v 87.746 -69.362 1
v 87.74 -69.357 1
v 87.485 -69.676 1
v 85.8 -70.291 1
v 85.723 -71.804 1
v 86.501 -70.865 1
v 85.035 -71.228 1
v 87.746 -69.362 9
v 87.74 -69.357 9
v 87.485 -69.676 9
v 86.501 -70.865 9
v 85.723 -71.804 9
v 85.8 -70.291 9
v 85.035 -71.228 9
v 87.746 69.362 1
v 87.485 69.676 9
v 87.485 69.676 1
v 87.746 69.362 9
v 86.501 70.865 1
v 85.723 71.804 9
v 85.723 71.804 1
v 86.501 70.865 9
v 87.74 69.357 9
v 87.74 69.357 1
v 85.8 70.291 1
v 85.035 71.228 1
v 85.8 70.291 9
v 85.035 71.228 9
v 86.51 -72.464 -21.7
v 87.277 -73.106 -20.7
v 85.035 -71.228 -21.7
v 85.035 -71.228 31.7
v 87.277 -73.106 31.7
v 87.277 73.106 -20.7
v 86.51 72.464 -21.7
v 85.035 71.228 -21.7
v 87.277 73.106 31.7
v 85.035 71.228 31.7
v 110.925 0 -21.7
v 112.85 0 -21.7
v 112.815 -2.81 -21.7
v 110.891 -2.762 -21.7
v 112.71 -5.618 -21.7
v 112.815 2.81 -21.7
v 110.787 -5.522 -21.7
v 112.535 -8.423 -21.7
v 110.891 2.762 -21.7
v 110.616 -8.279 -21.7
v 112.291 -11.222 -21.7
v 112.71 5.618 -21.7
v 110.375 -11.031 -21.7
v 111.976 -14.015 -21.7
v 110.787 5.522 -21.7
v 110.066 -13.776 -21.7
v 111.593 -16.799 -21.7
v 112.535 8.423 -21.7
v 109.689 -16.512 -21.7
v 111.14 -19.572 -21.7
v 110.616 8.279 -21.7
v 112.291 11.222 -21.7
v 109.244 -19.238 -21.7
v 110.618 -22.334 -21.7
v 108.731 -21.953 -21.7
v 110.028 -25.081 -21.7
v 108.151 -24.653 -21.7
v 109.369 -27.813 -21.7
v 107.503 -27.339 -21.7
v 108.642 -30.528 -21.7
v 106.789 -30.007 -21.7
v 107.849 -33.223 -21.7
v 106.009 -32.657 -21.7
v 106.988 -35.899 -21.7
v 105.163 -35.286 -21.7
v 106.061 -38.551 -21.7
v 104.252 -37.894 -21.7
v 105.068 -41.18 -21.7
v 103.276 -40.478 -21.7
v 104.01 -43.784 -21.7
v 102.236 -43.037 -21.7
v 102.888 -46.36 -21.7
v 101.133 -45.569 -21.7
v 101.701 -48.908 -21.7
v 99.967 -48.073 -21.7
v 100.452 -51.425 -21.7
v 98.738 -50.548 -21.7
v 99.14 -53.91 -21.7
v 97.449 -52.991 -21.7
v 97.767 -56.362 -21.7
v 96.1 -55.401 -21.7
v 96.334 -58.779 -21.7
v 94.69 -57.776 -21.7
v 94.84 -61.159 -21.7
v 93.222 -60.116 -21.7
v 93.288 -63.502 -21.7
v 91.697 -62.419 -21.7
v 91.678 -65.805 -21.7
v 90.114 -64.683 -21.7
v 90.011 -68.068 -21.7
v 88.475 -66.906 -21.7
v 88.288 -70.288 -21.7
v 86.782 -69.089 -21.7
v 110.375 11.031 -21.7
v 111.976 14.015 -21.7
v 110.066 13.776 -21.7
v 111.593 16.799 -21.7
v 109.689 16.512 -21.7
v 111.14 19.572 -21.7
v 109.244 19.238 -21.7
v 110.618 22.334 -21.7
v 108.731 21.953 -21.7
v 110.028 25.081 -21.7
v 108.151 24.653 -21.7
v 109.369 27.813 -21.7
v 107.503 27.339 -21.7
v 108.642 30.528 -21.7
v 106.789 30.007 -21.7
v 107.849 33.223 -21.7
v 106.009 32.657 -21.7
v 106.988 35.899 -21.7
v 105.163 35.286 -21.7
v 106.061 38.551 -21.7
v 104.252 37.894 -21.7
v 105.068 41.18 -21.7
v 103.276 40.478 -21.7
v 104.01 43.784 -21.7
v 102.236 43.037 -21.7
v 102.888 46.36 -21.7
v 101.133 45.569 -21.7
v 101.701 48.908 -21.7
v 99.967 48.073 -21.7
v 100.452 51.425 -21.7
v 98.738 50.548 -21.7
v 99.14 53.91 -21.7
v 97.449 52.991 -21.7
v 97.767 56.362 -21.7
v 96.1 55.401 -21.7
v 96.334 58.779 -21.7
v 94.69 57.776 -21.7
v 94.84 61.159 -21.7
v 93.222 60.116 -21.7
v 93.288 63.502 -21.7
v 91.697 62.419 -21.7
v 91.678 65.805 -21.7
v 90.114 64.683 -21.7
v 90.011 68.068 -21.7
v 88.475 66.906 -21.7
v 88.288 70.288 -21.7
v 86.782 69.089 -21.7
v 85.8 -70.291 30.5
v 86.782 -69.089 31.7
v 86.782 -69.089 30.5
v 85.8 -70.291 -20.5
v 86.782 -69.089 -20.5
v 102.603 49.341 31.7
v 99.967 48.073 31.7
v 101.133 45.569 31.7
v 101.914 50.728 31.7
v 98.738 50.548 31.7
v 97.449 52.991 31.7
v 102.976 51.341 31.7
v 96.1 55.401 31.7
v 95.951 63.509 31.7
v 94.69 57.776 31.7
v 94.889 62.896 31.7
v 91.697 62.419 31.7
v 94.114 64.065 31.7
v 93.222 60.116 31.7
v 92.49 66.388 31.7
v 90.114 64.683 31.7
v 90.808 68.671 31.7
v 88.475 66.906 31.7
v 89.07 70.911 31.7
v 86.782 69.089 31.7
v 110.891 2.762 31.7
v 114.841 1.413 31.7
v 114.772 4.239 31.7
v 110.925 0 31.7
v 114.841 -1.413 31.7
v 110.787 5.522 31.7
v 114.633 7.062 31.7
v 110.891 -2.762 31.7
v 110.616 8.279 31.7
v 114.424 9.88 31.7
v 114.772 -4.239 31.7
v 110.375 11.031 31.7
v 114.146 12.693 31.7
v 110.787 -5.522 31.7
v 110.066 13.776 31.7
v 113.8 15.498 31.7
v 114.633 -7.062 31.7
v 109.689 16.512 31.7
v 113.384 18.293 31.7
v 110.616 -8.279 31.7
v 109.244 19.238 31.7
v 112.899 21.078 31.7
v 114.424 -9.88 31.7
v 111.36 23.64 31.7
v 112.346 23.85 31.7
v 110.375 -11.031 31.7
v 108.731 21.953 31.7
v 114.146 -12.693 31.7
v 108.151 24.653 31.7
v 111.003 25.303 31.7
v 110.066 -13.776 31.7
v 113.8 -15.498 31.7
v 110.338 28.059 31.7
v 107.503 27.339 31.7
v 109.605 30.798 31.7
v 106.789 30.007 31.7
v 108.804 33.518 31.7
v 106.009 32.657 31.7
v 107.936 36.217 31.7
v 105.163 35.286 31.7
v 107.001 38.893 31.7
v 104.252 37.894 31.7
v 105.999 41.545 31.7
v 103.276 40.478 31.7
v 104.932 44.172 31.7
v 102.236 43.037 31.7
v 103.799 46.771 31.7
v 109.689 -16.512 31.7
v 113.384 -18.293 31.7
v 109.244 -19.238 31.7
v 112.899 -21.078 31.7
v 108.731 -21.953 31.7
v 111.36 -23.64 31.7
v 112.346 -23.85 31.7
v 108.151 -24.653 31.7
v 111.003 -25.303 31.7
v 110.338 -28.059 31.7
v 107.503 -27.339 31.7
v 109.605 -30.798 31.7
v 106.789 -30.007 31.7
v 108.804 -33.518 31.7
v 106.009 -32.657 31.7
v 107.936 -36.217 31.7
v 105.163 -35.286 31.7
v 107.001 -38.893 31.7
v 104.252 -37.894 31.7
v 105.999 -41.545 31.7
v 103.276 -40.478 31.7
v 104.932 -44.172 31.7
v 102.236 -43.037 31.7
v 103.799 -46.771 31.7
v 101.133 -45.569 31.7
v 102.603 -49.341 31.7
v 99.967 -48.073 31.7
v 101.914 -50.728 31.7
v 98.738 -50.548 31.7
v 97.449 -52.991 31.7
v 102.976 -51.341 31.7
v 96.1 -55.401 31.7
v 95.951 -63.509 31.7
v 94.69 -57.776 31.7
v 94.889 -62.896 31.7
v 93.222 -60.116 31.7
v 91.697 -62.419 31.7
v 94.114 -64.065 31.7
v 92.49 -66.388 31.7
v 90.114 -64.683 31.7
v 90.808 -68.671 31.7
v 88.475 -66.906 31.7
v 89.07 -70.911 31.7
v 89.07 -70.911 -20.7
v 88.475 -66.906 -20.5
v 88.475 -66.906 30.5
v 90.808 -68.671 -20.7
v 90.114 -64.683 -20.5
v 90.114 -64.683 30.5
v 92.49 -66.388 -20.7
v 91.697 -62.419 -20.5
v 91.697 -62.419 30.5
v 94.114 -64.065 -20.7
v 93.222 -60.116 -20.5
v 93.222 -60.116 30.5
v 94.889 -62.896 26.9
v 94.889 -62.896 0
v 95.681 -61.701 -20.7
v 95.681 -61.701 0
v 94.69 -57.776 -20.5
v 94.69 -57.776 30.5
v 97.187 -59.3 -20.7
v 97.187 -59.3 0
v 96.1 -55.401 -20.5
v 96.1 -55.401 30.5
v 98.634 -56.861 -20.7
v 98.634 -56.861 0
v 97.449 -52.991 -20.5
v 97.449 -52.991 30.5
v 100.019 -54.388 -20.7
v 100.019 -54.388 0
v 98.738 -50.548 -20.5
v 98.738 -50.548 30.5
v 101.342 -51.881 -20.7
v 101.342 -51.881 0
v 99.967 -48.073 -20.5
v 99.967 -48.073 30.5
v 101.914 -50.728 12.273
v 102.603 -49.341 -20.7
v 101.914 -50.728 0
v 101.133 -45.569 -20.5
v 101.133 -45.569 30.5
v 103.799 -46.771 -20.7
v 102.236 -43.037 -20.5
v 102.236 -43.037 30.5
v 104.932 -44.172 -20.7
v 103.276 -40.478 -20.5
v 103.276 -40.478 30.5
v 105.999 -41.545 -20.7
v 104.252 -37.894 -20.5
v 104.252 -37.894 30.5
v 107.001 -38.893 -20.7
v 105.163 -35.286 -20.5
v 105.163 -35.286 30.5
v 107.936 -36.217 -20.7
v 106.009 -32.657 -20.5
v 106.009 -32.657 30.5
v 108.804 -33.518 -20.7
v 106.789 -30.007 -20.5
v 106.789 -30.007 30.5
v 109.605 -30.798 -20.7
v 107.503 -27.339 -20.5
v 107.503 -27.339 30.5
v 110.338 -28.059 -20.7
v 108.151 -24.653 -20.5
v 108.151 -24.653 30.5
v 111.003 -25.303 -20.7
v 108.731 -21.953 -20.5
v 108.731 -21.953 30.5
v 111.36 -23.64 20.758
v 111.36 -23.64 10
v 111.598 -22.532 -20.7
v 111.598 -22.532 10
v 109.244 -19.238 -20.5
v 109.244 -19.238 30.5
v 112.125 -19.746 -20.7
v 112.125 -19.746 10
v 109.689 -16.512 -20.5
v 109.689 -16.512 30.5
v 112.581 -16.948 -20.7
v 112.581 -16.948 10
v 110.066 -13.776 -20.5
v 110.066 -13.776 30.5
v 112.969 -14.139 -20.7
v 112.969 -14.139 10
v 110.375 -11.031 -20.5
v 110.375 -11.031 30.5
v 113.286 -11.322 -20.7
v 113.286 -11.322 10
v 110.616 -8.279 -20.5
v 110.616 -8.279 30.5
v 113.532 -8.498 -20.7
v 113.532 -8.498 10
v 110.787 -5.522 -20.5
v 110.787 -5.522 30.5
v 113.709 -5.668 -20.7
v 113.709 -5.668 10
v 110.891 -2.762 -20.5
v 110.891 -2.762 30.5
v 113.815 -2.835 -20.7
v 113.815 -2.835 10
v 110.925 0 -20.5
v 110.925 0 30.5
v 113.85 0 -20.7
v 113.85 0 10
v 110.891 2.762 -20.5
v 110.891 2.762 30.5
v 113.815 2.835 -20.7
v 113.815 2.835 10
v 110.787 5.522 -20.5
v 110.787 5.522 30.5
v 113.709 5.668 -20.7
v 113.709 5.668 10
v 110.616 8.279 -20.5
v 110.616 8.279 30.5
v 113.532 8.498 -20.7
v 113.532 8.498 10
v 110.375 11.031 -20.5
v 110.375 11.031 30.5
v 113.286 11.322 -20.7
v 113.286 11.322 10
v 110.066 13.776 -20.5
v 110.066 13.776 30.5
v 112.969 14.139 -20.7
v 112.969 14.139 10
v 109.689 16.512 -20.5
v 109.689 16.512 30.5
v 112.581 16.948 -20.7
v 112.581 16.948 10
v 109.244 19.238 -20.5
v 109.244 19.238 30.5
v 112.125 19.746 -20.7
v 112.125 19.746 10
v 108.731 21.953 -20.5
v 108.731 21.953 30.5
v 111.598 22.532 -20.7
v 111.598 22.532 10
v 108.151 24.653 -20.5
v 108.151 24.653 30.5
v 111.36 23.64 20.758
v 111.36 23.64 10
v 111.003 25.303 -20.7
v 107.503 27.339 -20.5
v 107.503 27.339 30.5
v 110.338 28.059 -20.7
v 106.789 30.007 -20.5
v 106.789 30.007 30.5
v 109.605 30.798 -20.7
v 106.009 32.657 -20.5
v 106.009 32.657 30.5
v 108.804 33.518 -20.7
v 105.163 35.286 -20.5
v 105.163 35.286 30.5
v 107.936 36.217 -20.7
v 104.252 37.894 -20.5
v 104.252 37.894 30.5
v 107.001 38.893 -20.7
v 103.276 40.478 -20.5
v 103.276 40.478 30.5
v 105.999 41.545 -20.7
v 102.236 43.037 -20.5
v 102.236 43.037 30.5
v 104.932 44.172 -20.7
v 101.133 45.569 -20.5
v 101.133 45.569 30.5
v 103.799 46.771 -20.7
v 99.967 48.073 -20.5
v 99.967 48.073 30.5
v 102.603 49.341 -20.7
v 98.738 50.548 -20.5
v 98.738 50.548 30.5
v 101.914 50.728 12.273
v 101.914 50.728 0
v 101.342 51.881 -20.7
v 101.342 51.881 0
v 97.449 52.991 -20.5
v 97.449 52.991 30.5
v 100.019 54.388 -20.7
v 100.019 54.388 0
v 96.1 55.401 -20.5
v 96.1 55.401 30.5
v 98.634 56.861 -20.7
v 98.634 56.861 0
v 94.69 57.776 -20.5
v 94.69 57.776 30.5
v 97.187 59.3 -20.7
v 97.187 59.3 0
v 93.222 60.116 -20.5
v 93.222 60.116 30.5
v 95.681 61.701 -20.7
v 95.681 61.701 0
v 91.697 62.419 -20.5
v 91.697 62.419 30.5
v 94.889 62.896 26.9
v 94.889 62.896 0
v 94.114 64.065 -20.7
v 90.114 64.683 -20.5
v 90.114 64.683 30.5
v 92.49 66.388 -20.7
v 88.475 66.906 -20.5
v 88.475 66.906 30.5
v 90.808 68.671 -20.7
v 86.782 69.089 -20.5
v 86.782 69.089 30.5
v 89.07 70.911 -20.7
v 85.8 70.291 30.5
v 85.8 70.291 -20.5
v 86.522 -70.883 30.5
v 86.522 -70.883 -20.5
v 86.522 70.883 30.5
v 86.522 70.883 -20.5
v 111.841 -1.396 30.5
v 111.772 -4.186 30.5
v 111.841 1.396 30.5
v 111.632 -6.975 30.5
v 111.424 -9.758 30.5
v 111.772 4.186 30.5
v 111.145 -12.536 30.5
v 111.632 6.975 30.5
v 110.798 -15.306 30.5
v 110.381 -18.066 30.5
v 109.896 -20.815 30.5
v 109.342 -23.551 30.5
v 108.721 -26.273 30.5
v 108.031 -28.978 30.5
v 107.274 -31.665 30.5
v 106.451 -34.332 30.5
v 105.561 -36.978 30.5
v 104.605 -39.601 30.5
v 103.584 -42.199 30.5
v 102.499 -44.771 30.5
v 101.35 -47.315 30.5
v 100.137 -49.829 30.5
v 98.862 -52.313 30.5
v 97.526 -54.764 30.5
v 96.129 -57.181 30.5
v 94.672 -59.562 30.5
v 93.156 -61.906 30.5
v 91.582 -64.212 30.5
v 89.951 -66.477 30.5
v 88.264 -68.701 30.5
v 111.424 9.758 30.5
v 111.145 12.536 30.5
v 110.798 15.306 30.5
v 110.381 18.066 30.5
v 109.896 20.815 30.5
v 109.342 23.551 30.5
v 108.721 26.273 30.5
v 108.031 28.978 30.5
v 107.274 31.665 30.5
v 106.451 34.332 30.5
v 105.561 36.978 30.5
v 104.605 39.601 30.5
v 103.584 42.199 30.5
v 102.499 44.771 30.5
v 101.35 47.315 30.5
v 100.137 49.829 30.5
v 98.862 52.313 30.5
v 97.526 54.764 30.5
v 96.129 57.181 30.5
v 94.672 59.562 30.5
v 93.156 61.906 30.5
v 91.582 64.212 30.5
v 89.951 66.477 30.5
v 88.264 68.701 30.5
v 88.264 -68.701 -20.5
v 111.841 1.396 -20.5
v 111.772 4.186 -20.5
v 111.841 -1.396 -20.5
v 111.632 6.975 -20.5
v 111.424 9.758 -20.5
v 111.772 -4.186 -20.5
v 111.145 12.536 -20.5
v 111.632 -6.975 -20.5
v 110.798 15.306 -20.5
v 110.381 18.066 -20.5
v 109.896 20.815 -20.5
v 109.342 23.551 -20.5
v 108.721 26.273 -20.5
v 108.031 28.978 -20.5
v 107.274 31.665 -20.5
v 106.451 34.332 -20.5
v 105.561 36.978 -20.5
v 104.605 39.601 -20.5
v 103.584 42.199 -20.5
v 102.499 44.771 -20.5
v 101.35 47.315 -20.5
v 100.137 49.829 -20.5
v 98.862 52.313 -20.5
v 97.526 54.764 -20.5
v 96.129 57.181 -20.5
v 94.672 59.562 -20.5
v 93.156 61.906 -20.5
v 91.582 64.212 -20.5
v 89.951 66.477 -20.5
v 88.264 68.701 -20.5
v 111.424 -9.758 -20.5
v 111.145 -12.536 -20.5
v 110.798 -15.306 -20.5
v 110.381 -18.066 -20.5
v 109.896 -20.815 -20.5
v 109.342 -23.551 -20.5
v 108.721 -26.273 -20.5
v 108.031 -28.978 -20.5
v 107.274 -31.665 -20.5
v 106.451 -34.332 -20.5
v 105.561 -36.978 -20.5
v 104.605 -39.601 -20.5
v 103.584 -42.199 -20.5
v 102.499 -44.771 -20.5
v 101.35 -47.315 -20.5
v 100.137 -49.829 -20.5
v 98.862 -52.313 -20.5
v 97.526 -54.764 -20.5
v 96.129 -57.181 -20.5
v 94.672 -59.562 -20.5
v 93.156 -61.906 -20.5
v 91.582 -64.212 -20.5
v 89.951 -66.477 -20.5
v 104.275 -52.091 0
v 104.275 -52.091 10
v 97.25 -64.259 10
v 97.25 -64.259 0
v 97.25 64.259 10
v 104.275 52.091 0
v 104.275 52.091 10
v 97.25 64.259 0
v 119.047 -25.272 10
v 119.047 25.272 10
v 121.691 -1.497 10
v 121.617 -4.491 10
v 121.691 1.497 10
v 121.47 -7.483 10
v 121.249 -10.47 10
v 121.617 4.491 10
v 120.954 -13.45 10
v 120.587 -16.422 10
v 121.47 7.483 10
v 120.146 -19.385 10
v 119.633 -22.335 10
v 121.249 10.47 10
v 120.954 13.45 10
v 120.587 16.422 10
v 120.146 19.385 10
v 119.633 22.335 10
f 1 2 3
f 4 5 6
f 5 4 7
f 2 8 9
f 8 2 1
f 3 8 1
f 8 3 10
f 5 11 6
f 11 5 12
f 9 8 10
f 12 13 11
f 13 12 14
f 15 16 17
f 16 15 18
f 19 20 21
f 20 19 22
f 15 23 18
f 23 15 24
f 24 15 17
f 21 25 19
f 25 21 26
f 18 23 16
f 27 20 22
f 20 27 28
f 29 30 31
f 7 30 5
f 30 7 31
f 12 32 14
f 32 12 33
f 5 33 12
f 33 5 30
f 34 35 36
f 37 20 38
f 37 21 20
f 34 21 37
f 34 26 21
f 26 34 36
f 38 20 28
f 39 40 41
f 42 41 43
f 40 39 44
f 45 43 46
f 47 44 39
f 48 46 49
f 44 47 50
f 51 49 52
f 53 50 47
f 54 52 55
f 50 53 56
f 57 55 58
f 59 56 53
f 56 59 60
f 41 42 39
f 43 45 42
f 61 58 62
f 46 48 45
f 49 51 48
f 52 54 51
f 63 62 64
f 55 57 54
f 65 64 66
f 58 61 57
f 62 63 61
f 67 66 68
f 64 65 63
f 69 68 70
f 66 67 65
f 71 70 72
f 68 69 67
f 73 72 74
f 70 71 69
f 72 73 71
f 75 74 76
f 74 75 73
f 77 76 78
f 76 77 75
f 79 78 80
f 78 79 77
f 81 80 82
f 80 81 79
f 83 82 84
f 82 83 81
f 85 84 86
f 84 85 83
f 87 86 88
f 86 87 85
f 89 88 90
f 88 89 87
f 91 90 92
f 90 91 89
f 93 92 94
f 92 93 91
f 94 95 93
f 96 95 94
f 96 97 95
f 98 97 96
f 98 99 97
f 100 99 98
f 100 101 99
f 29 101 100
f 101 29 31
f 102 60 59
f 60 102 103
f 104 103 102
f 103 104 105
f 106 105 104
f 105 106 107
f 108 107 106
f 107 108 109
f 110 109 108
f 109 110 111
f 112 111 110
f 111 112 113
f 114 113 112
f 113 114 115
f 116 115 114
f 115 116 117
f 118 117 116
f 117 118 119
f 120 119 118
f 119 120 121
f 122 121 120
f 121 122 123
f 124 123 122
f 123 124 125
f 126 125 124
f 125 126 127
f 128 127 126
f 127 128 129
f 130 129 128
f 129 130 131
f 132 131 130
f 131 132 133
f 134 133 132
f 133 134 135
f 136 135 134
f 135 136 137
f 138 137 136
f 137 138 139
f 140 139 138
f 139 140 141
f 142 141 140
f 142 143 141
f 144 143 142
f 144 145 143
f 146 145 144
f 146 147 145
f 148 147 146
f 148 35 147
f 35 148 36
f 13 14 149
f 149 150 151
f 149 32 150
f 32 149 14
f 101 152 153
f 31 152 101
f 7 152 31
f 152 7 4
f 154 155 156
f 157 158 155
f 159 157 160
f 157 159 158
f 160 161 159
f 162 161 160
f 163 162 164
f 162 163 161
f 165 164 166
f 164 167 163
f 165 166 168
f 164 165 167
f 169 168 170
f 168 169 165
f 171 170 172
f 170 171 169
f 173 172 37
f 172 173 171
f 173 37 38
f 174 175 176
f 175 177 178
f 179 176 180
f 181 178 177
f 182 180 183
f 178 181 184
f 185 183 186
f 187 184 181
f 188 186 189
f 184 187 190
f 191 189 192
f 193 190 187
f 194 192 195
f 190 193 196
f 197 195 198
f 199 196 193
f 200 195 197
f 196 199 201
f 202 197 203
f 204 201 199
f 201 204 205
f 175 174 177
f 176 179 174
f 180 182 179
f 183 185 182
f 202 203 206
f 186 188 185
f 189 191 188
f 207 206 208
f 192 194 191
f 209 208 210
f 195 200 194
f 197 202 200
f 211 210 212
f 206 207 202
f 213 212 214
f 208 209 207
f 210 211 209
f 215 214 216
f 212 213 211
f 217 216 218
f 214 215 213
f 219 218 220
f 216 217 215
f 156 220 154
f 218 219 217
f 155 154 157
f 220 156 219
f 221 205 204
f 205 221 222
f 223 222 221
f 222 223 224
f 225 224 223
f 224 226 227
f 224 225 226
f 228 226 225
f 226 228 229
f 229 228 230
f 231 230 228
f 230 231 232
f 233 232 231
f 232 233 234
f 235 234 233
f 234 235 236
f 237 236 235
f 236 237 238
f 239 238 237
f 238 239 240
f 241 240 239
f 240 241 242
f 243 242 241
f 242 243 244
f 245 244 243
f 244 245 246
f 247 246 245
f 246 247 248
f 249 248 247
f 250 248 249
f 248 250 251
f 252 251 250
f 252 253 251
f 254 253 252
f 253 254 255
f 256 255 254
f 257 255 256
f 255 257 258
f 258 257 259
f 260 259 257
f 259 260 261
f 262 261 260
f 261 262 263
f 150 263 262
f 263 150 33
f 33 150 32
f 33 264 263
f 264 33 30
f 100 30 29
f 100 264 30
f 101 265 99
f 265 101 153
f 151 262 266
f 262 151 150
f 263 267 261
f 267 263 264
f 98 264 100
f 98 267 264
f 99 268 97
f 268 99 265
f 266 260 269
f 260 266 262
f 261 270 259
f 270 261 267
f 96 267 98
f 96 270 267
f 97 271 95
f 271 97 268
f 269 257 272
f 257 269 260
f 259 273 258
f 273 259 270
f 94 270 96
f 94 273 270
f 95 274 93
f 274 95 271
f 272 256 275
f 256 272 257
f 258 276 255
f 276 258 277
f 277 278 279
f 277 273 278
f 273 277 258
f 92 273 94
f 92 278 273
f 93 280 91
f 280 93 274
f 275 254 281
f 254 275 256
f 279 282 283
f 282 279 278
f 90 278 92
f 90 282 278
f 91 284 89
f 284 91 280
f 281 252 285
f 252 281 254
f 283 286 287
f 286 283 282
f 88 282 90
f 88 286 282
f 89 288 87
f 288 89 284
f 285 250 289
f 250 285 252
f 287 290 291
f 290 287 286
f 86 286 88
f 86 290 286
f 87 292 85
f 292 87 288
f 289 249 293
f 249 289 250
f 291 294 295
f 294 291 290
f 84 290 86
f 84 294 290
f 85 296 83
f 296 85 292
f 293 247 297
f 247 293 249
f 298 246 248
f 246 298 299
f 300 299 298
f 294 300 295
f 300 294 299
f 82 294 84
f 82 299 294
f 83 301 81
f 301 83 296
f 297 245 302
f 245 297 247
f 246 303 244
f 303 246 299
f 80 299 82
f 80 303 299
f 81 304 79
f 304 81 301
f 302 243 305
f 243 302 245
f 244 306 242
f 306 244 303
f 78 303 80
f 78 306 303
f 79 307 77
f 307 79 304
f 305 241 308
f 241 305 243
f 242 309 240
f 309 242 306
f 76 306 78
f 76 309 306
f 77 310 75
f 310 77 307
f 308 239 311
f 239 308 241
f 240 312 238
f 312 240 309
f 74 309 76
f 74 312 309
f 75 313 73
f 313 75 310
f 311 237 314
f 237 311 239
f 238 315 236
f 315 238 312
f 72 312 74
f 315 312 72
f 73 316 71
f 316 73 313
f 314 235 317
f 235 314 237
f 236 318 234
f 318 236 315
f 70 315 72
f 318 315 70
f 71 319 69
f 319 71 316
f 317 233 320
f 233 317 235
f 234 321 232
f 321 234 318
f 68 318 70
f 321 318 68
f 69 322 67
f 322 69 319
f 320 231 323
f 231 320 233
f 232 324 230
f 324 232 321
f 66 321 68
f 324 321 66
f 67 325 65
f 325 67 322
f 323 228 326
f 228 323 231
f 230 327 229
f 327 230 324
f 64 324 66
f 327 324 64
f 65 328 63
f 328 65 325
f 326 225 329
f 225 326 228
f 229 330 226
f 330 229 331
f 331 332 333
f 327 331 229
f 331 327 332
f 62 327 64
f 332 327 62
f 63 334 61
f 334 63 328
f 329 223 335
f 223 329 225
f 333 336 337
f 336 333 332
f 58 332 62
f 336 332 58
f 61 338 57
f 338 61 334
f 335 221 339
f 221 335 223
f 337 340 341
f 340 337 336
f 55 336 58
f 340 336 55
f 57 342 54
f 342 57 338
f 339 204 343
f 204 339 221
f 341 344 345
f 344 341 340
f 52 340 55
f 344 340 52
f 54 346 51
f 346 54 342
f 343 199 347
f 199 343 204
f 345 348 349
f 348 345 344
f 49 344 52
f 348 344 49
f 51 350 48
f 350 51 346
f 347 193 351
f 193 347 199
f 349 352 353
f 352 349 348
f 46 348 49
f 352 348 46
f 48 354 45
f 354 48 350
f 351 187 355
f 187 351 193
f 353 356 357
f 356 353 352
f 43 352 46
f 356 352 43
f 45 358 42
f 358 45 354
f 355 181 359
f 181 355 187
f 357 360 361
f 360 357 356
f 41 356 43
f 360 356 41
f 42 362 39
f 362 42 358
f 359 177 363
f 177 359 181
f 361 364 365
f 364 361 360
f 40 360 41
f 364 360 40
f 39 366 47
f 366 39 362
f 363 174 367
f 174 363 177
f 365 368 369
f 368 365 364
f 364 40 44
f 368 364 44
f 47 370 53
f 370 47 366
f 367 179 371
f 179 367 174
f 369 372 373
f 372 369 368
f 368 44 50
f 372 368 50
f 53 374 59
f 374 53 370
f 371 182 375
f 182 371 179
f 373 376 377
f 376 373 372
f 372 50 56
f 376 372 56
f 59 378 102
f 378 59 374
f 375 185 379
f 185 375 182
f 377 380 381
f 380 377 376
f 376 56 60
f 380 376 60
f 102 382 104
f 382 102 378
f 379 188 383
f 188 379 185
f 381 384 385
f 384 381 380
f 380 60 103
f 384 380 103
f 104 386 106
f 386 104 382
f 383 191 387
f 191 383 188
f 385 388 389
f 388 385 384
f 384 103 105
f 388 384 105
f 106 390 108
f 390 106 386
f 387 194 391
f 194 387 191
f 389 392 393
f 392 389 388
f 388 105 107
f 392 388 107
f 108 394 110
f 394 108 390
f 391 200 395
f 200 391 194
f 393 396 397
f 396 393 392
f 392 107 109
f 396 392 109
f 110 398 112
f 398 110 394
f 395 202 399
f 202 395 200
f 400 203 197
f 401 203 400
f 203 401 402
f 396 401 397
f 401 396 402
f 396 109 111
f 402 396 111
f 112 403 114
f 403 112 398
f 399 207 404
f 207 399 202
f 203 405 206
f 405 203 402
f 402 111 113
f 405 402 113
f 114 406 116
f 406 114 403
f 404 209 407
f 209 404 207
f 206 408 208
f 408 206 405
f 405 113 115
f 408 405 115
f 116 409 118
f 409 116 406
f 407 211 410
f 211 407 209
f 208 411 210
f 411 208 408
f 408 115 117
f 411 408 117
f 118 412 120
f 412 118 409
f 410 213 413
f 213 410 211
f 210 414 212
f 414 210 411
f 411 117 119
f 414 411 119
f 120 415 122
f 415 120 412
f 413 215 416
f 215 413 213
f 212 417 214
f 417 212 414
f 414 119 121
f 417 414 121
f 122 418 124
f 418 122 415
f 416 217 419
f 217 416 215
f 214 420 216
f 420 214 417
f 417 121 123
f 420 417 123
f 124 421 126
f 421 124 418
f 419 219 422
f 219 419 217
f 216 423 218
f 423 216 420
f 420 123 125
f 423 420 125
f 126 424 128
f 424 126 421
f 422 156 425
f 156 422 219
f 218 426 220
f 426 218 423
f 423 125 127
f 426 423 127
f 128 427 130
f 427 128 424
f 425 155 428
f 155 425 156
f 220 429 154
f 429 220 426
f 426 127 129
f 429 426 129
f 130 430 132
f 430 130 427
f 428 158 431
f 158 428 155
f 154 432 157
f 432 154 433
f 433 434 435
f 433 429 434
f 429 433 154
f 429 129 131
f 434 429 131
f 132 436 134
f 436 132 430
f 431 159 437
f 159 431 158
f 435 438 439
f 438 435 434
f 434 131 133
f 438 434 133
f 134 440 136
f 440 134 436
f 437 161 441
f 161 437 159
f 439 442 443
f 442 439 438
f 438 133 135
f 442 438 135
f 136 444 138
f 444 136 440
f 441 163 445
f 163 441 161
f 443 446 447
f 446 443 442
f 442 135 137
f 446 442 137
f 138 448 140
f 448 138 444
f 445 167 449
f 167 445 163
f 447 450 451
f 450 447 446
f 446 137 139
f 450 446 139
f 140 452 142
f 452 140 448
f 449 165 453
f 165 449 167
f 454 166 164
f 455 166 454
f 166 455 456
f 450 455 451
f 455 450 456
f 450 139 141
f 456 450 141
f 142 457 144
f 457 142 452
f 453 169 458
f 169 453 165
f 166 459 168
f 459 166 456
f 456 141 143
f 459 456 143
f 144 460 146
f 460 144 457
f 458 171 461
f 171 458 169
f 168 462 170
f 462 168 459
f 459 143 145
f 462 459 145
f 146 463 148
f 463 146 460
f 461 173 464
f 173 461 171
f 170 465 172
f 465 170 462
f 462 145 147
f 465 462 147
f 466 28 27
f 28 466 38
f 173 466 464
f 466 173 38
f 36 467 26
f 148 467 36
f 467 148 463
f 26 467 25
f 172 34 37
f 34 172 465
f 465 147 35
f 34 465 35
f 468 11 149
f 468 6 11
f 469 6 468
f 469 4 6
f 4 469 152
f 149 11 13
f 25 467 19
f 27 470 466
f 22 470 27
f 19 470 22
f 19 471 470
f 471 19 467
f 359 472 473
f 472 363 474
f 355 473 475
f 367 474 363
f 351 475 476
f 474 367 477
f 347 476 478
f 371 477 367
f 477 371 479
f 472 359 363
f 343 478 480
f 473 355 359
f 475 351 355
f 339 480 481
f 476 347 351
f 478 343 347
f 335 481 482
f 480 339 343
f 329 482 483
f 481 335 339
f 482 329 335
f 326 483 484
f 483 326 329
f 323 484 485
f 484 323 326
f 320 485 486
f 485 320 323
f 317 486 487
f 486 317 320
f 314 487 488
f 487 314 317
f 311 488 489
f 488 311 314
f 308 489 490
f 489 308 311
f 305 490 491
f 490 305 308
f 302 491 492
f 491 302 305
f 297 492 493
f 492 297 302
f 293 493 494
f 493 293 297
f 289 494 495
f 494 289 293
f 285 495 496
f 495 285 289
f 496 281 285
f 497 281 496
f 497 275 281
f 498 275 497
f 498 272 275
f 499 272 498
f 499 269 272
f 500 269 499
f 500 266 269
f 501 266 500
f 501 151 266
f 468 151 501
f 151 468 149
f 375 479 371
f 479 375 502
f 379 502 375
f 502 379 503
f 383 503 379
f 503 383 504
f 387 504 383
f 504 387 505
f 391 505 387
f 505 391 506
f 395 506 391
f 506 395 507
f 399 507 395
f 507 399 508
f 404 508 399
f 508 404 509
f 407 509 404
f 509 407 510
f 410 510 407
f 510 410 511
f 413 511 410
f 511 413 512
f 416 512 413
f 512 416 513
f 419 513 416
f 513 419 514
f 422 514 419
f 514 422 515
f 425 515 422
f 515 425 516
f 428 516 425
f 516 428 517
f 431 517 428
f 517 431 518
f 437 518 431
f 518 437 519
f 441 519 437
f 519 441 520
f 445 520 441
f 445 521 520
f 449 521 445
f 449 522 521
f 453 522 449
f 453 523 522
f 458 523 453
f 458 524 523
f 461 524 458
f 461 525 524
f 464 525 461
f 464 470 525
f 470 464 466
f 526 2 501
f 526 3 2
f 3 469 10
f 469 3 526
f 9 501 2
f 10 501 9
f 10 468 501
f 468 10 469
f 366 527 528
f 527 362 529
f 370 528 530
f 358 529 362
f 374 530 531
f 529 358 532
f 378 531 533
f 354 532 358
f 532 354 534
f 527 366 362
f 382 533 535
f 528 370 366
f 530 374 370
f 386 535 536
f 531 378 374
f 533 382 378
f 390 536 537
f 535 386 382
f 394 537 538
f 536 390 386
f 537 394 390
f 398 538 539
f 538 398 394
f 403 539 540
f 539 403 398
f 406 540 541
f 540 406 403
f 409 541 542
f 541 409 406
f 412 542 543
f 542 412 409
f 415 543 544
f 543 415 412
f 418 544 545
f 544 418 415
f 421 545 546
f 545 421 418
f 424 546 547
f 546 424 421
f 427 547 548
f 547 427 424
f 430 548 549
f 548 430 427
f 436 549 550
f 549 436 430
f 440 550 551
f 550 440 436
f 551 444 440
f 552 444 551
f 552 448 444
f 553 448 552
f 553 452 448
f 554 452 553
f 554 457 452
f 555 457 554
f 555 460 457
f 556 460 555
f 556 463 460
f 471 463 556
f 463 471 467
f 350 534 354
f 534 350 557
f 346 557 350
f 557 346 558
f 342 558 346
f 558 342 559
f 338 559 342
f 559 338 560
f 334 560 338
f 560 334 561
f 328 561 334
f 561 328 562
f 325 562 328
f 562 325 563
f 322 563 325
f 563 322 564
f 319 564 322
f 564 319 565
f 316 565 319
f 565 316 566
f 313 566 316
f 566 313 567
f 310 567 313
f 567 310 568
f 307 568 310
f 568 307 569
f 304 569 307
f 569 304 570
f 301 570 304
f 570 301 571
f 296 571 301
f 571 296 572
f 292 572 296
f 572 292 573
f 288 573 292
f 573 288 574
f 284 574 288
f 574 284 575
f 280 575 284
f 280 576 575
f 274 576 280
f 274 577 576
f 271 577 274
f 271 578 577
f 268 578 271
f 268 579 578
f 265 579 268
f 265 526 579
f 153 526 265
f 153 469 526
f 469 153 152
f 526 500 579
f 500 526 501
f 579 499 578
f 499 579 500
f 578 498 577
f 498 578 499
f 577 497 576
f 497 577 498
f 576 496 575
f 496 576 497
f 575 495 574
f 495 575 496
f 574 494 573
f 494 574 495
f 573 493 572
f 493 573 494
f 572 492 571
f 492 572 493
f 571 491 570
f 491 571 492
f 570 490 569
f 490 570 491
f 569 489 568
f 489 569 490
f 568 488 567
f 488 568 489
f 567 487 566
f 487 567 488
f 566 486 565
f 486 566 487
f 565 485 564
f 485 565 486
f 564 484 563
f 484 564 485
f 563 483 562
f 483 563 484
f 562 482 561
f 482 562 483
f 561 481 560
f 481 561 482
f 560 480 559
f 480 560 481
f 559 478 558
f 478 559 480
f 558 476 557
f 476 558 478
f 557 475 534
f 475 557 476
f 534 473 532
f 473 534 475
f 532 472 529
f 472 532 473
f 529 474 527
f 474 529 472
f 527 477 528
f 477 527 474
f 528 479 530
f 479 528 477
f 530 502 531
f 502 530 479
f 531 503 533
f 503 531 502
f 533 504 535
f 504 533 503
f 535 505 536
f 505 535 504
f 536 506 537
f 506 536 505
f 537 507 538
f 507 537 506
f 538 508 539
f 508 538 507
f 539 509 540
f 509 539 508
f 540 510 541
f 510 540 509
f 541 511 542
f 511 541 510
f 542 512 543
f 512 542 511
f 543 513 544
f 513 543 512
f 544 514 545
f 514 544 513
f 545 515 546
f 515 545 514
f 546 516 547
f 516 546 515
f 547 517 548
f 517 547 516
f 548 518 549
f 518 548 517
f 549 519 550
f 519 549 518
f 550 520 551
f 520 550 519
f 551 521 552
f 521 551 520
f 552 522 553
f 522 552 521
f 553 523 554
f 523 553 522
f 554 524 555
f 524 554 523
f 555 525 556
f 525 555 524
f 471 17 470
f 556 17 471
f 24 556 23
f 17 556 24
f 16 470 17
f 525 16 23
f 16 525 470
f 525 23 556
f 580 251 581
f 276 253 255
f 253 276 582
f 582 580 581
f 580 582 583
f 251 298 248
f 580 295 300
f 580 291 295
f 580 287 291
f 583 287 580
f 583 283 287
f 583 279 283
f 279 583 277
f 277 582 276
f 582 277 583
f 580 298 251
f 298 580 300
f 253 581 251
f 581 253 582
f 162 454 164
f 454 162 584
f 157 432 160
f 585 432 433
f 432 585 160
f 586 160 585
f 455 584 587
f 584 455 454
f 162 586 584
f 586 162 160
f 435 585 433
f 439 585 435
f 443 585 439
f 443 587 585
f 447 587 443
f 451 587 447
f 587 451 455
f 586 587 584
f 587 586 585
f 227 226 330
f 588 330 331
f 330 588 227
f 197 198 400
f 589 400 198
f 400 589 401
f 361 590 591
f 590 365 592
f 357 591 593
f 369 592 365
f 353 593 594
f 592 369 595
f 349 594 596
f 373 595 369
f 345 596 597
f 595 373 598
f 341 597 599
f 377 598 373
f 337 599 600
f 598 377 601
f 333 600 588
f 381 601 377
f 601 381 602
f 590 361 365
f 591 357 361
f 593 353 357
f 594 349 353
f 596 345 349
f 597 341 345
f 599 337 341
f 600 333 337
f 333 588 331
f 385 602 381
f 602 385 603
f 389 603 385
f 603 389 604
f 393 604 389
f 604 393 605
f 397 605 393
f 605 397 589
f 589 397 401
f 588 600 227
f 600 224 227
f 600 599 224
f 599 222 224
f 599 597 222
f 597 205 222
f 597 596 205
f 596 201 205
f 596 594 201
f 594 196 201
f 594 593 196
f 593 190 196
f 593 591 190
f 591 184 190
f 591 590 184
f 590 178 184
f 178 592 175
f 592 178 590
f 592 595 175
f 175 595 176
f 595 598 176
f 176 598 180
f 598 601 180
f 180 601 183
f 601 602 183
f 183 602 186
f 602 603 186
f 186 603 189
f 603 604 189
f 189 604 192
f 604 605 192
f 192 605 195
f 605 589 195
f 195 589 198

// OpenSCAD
// file: ../purchased/heat_pad.scad
/**
 * @file heat_pad.scad
 * @brief A silicone heating pad, drawn flat: length along x and height along z, centred on both,
 * with the glass-side face on y = 0 and the thickness toward +y
 * @author Cameron K. Brooks
 * @copyright 2026
 */

function heat_pad_name(type) = type[0];
function heat_pad_part_number(type) = type[1];
function heat_pad_length(type) = type[2][0];
function heat_pad_height(type) = type[2][1];
function heat_pad_thickness(type) = type[2][2];
function heat_pad_volts(type) = type[3][0];
function heat_pad_watts(type) = type[3][1];
function heat_pad_resistance(type) = type[4];
function heat_pad_lead_length(type) = type[5];
// the red-orange of the silicone
function heat_pad_color() = "#e2502a";

/**
 * @brief Draws a registered heating pad (see heat_pads.scad)
 * @param type Registered parameter set
 */
module heat_pad(type) {
  color(heat_pad_color())
    translate([-heat_pad_length(type) / 2, 0, -heat_pad_height(type) / 2])
      cube([heat_pad_length(type), heat_pad_thickness(type), heat_pad_height(type)]);
}
// file: ../utils/registries.scad
/**
 * @brief Look up a registered row by name.
 *
 * Build designations are passed as names, so every registry a build can designate wraps this
 * function below its list, where the list is in scope (a function resolves globals from its own
 * file):
 *
 *     use <../utils/registries.scad>;
 *     function shaft_by_name(name) = registry_by_name(shafts, name, "ssllsn");
 *
 * Rows are read by position, so `fields` describes the row layout. It is a signature with one
 * letter per field (s string, n number, l list, b bool; upper case if the field may also be
 * undef), or a list of signatures when a trailing field is optional. A plain number is also
 * accepted and checks only the length. Every row is checked on every lookup, not only the
 * requested one. A row with a missing or extra field, or a list where a number belongs, fails here
 * instead of returning the wrong value. Two swapped fields of the same type still pass; only named
 * fields would catch that.
 *
 * A missing name returns undef, and so does a duplicate name: two rows with the same name is a
 * defect, not a choice by list order. The caller must assert on the result, because only it can
 * name the registry searched. A failing assert exits 0, so the checks detect its ERROR line.
 */
function registry_by_name(rows, name, fields) =
  let (_checked = registry_checked(rows, fields))
  let (_m = [for (r = _checked) if (r[0] == name) r]) len(_m) == 1 ? _m[0] : undef;

// Returns the rows after checking that each fits one of the signatures. Also used directly for a
// registry whose rows have no name.
function registry_checked(rows, fields) =
  let (
    _n = is_list(fields) ? fields : [fields],
    _bad = [for (r = rows) if (len([for (f = _n) if (registry_row_fits(r, f)) f]) == 0) r[0]]
  )
  assert(len(_bad) == 0, str("registry rows ", _bad, " do not fit ", fields))
  rows;

function registry_row_fits(row, fields) =
  is_num(fields) ? len(row) == fields
  : len(row) == len(fields) && len([for (i = [0:len(fields) - 1]) if (!registry_field_fits(row[i], fields[i])) i]) == 0;

function registry_field_fits(v, t) =
  t == "s" ? is_string(v)
  : t == "n" ? is_num(v)
  : t == "l" ? is_list(v)
  : t == "b" ? is_bool(v)
  : t == "S" ? is_undef(v) || is_string(v)
  : t == "N" ? is_undef(v) || is_num(v)
  : t == "L" ? is_undef(v) || is_list(v)
  : t == "B" ? is_undef(v) || is_bool(v)
  : assert(false, str("registry signature letter \"", t, "\" is not one of s n l b S N L B"));
// file: ../purchased/heat_pads.scad
// parameters for physical realization of silicone heating pads
// DO NOT FORMAT THIS FILE, as it is manually spaced out for readability

// Silicone rubber over a nichrome element, powered from the reactor 12 V rail and held directly
// against the outside of the jar. No built-in thermostat: whatever switches the rail controls the
// pads. Size, thickness, cold resistance and lead length are measured on a delivered pad. Volts
// and watts are from the listing. At 12 V the measured resistance sets the power, not the watts
// column.

//                       ["name",       part_no,      [length, height, thickness], [volts, watts], ohms, lead]
// Generic 4-pack, 12 V 20 W, 150 x 50 mm - https://www.amazon.ca/dp/B0C4GX3F76
// Measured 2026-10-04: 7.6 ohm cold, so 18.9 W at 12 V; 320 mm leads.
heat_pad_20w_150x50 = ["20W 150x50", "B0C4GX3F76", [150,    50,     1.85     ], [12,    20   ], 7.6,  320 ];

// MECCANIXITY 2-pack, 12 V 30 W, 150 x 50 mm - https://www.amazon.ca/dp/B0GWNFH6LH
// Pending delivery; to be registered once measured. The listing gives only the 150 x 50 size.
// Cold resistance should be near 12^2 / 30 = 4.8 ohm.
// heat_pad_30w_150x50 = ["30W 150x50", "B0GWNFH6LH", [150,    50,     undef    ], [12,    30   ], undef, undef];

heat_pads = [heat_pad_20w_150x50];

use <../utils/registries.scad>;
function heat_pad_by_name(name) = registry_by_name(heat_pads, name, "ssllnn");

use <heat_pad.scad>

// example usage - keep commented, this file is include'd
// heat_pad(heat_pad_20w_150x50);
// main file
/**
 * @file heat_pad_mount.scad
 * @brief Holder for a silicone heating pad on the jar: a curved plate that holds the pad, hung
 * behind a rib arc
 * @author Cameron K. Brooks
 * @copyright 2026
 *
 * The pad sits directly on the glass, with the plate behind it. The inner face of the rib is
 * recessed to take the pad and plate with a small fit clearance. The rib arc between its rods acts
 * as the spring that holds the pad against the glass. Shim behind the plate until it is snug. The
 * plate drops in from the open band above the rib. Its hook rests on the top face of the rib, and
 * its two tabs slide down the empty light pockets of the rib, which locate it around the jar.
 *
 * All parts are placed about the jar axis: angle 0 is the centre of the plate, and z = 0 is the
 * bottom face of the rib arc it hangs behind. The render in this file is a preview.
 */

include <../purchased/heat_pads.scad>;

$fn = $preview ? 64 : 256;

/* [Preview] */

// Heating pad used in the preview
mount_pad_name = "20W 150x50"; // [20W 150x50]
// Outside radius of the jar, in mm
mount_glass_radius = 110;
// Height of the rib arc the plate hangs behind, in mm
mount_rib_height = 10;
// Radius of the back wall of the light pockets, in mm
mount_pocket_back = 118.7;
// Width of a light pocket, in mm
mount_pocket_width = 14.85;
// Angles of the pockets used by the tabs, either side of the plate centre, in degrees
mount_tab_angles = [-30, 30];
// Show the pad in place
mount_show_pad = true;

/* [Plate] */

// Thickness of the plate behind the pad, in mm
heat_pad_plate_thickness = 2;
// Radial clearance between the plate and the recess, taken up by shims, in mm
heat_pad_fit_clearance = 0.2;
// Chamfer on the lower back edge of the plate, to guide it into the recess, in mm
heat_pad_lead_in = 1;
// Width of the wall around the pad, in mm
heat_pad_wall_width = 1.2;
// Height of that wall toward the glass, as a fraction of the pad thickness
heat_pad_wall_fraction = 0.5;
// Gap between the pad edge and the wall, on each side, in mm
heat_pad_side_clearance = 0.5;
// Width of the lead notch through the end walls, in mm
heat_pad_lead_notch = 8;
// Distance the hook extends over the rib top face beyond the pocket back wall, in mm
heat_pad_hook_reach = 3;
// Remaining depth of the hook and tab stiffeners at the top edge of the plate, in mm
heat_pad_stiffener_top = 1;
// Angular width of the hook, as a fraction of the plate width
heat_pad_hook_fraction = 0.3;
// Distance a tab projects behind the plate, in mm
heat_pad_tab_depth = 2.5;
// Clearance on each side of a tab in its pocket, in mm
heat_pad_pocket_clearance = 0.4;
// Angular clearance at each end between the plate and the recess, in degrees
heat_pad_recess_end_clearance = 1;

module dummy() {
  // stop the customizer detection from here onwards
}

// ----- radii, from the glass out -----

function heat_pad_plate_inner_radius(pad, glass_r) = glass_r + heat_pad_thickness(pad);
function heat_pad_plate_outer_radius(pad, glass_r) = heat_pad_plate_inner_radius(pad, glass_r) + heat_pad_plate_thickness;
function heat_pad_recess_radius(pad, glass_r) = heat_pad_plate_outer_radius(pad, glass_r) + heat_pad_fit_clearance;

// ----- sizes -----

// The bay that holds the pad, then the plate around it.
function heat_pad_bay_length(pad) = heat_pad_length(pad) + 2 * heat_pad_side_clearance;
function heat_pad_bay_height(pad) = heat_pad_height(pad) + 2 * heat_pad_side_clearance;
function heat_pad_plate_length(pad) = heat_pad_bay_length(pad) + 2 * heat_pad_wall_width;
function heat_pad_plate_height(pad) = heat_pad_bay_height(pad) + 2 * heat_pad_wall_width;
// Arc lengths are measured at the pad radius, which is the glass radius.
function heat_pad_angle(len, glass_r) = len / glass_r * 180 / PI;
function heat_pad_plate_span(pad, glass_r) = heat_pad_angle(heat_pad_plate_length(pad), glass_r);
function heat_pad_recess_span(pad, glass_r) = heat_pad_plate_span(pad, glass_r) + 2 * heat_pad_recess_end_clearance;
// The plate is centred on the height of the rib arc.
function heat_pad_plate_bottom(pad, rib_h) = rib_h / 2 - heat_pad_plate_height(pad) / 2;

// A ring sector about z, centred on angle 0.
module heat_pad_sector(r0, r1, z0, z1, span) {
  rotate([0, 0, -span / 2])
    rotate_extrude(angle=span)
      translate([r0, z0]) square([r1 - r0, z1 - z0]);
}

/**
 * @brief The plate in its installed position, with the pad behind it. It prints top edge down.
 * The hook and the tabs each have a stiffener that runs up to that edge, so they print from the
 * bed without overhangs.
 */
module heat_pad_plate(pad, glass_r, rib_h, pocket_back, pocket_w, tab_angles) {
  _ri = heat_pad_plate_inner_radius(pad, glass_r);
  _ro = heat_pad_plate_outer_radius(pad, glass_r);
  _z0 = heat_pad_plate_bottom(pad, rib_h);
  _z1 = _z0 + heat_pad_plate_height(pad);
  _span = heat_pad_plate_span(pad, glass_r);
  _bay = heat_pad_angle(heat_pad_bay_length(pad), glass_r);
  _wall_r = _ri - heat_pad_wall_fraction * heat_pad_thickness(pad);
  _tab_w = pocket_w - 2 * heat_pad_pocket_clearance;
  _tab_r = _ro + heat_pad_tab_depth;
  _sink = heat_pad_plate_thickness / 2;

  union() {
    // The plate and the wall around the pad are one profile, from the wall face to the back of
    // the plate, with the lower back edge chamfered as a lead-in to the recess. The pad bay and
    // the lead exit through both end walls at mid-height are cut from it. It is one solid, so no
    // two parts share a surface. Each cut overshoots the wall face toward the glass, where nothing
    // is kept.
    difference() {
      rotate([0, 0, -_span / 2])
        rotate_extrude(angle=_span)
          polygon([[_wall_r, _z0], [_ro - heat_pad_lead_in, _z0], [_ro, _z0 + heat_pad_lead_in], [_ro, _z1], [_wall_r, _z1]]);
      heat_pad_sector(_wall_r - 1, _ri, _z0 + heat_pad_wall_width, _z1 - heat_pad_wall_width, _bay);
      for (s = [-1, 1])
        rotate([0, 0, s * (_span + _bay) / 4])
          heat_pad_sector(_wall_r - 1, _ri, (_z0 + _z1) / 2 - heat_pad_lead_notch / 2, (_z0 + _z1) / 2 + heat_pad_lead_notch / 2, (_span - _bay) / 2 + 2);
    }
    // the hook, over the top face of the rib, tapering up to the top edge
    rotate([0, 0, -_span * heat_pad_hook_fraction / 2])
      rotate_extrude(angle=_span * heat_pad_hook_fraction)
        polygon([
          [_ro - _sink, rib_h],
          [pocket_back + heat_pad_hook_reach, rib_h],
          [_ro + heat_pad_stiffener_top, _z1],
          [_ro - _sink, _z1],
        ]);
    // the tabs, the full rib height inside the pockets, tapering up to the top edge
    for (a = tab_angles)
      rotate([0, 0, a])
        rotate([90, 0, 0])
          linear_extrude(_tab_w, center=true)
            polygon([
              [_ro - _sink, 0],
              [_tab_r, 0],
              [_tab_r, rib_h],
              [_ro + heat_pad_stiffener_top, _z1],
              [_ro - _sink, _z1],
            ]);
  }
}

// The pad, bent onto the glass.
module heat_pad_fitted(pad, glass_r, rib_h) {
  color(heat_pad_color())
    heat_pad_sector(glass_r, heat_pad_plate_inner_radius(pad, glass_r), rib_h / 2 - heat_pad_height(pad) / 2,
      rib_h / 2 + heat_pad_height(pad) / 2, heat_pad_angle(heat_pad_length(pad), glass_r));
}

_mount_pad = heat_pad_by_name(mount_pad_name);
heat_pad_plate(_mount_pad, mount_glass_radius, mount_rib_height, mount_pocket_back, mount_pocket_width, mount_tab_angles);
// shown, not rendered: it lies on the floor of the plate bay and is not a printed part
if (mount_show_pad)
  %heat_pad_fitted(_mount_pad, mount_glass_radius, mount_rib_height);
